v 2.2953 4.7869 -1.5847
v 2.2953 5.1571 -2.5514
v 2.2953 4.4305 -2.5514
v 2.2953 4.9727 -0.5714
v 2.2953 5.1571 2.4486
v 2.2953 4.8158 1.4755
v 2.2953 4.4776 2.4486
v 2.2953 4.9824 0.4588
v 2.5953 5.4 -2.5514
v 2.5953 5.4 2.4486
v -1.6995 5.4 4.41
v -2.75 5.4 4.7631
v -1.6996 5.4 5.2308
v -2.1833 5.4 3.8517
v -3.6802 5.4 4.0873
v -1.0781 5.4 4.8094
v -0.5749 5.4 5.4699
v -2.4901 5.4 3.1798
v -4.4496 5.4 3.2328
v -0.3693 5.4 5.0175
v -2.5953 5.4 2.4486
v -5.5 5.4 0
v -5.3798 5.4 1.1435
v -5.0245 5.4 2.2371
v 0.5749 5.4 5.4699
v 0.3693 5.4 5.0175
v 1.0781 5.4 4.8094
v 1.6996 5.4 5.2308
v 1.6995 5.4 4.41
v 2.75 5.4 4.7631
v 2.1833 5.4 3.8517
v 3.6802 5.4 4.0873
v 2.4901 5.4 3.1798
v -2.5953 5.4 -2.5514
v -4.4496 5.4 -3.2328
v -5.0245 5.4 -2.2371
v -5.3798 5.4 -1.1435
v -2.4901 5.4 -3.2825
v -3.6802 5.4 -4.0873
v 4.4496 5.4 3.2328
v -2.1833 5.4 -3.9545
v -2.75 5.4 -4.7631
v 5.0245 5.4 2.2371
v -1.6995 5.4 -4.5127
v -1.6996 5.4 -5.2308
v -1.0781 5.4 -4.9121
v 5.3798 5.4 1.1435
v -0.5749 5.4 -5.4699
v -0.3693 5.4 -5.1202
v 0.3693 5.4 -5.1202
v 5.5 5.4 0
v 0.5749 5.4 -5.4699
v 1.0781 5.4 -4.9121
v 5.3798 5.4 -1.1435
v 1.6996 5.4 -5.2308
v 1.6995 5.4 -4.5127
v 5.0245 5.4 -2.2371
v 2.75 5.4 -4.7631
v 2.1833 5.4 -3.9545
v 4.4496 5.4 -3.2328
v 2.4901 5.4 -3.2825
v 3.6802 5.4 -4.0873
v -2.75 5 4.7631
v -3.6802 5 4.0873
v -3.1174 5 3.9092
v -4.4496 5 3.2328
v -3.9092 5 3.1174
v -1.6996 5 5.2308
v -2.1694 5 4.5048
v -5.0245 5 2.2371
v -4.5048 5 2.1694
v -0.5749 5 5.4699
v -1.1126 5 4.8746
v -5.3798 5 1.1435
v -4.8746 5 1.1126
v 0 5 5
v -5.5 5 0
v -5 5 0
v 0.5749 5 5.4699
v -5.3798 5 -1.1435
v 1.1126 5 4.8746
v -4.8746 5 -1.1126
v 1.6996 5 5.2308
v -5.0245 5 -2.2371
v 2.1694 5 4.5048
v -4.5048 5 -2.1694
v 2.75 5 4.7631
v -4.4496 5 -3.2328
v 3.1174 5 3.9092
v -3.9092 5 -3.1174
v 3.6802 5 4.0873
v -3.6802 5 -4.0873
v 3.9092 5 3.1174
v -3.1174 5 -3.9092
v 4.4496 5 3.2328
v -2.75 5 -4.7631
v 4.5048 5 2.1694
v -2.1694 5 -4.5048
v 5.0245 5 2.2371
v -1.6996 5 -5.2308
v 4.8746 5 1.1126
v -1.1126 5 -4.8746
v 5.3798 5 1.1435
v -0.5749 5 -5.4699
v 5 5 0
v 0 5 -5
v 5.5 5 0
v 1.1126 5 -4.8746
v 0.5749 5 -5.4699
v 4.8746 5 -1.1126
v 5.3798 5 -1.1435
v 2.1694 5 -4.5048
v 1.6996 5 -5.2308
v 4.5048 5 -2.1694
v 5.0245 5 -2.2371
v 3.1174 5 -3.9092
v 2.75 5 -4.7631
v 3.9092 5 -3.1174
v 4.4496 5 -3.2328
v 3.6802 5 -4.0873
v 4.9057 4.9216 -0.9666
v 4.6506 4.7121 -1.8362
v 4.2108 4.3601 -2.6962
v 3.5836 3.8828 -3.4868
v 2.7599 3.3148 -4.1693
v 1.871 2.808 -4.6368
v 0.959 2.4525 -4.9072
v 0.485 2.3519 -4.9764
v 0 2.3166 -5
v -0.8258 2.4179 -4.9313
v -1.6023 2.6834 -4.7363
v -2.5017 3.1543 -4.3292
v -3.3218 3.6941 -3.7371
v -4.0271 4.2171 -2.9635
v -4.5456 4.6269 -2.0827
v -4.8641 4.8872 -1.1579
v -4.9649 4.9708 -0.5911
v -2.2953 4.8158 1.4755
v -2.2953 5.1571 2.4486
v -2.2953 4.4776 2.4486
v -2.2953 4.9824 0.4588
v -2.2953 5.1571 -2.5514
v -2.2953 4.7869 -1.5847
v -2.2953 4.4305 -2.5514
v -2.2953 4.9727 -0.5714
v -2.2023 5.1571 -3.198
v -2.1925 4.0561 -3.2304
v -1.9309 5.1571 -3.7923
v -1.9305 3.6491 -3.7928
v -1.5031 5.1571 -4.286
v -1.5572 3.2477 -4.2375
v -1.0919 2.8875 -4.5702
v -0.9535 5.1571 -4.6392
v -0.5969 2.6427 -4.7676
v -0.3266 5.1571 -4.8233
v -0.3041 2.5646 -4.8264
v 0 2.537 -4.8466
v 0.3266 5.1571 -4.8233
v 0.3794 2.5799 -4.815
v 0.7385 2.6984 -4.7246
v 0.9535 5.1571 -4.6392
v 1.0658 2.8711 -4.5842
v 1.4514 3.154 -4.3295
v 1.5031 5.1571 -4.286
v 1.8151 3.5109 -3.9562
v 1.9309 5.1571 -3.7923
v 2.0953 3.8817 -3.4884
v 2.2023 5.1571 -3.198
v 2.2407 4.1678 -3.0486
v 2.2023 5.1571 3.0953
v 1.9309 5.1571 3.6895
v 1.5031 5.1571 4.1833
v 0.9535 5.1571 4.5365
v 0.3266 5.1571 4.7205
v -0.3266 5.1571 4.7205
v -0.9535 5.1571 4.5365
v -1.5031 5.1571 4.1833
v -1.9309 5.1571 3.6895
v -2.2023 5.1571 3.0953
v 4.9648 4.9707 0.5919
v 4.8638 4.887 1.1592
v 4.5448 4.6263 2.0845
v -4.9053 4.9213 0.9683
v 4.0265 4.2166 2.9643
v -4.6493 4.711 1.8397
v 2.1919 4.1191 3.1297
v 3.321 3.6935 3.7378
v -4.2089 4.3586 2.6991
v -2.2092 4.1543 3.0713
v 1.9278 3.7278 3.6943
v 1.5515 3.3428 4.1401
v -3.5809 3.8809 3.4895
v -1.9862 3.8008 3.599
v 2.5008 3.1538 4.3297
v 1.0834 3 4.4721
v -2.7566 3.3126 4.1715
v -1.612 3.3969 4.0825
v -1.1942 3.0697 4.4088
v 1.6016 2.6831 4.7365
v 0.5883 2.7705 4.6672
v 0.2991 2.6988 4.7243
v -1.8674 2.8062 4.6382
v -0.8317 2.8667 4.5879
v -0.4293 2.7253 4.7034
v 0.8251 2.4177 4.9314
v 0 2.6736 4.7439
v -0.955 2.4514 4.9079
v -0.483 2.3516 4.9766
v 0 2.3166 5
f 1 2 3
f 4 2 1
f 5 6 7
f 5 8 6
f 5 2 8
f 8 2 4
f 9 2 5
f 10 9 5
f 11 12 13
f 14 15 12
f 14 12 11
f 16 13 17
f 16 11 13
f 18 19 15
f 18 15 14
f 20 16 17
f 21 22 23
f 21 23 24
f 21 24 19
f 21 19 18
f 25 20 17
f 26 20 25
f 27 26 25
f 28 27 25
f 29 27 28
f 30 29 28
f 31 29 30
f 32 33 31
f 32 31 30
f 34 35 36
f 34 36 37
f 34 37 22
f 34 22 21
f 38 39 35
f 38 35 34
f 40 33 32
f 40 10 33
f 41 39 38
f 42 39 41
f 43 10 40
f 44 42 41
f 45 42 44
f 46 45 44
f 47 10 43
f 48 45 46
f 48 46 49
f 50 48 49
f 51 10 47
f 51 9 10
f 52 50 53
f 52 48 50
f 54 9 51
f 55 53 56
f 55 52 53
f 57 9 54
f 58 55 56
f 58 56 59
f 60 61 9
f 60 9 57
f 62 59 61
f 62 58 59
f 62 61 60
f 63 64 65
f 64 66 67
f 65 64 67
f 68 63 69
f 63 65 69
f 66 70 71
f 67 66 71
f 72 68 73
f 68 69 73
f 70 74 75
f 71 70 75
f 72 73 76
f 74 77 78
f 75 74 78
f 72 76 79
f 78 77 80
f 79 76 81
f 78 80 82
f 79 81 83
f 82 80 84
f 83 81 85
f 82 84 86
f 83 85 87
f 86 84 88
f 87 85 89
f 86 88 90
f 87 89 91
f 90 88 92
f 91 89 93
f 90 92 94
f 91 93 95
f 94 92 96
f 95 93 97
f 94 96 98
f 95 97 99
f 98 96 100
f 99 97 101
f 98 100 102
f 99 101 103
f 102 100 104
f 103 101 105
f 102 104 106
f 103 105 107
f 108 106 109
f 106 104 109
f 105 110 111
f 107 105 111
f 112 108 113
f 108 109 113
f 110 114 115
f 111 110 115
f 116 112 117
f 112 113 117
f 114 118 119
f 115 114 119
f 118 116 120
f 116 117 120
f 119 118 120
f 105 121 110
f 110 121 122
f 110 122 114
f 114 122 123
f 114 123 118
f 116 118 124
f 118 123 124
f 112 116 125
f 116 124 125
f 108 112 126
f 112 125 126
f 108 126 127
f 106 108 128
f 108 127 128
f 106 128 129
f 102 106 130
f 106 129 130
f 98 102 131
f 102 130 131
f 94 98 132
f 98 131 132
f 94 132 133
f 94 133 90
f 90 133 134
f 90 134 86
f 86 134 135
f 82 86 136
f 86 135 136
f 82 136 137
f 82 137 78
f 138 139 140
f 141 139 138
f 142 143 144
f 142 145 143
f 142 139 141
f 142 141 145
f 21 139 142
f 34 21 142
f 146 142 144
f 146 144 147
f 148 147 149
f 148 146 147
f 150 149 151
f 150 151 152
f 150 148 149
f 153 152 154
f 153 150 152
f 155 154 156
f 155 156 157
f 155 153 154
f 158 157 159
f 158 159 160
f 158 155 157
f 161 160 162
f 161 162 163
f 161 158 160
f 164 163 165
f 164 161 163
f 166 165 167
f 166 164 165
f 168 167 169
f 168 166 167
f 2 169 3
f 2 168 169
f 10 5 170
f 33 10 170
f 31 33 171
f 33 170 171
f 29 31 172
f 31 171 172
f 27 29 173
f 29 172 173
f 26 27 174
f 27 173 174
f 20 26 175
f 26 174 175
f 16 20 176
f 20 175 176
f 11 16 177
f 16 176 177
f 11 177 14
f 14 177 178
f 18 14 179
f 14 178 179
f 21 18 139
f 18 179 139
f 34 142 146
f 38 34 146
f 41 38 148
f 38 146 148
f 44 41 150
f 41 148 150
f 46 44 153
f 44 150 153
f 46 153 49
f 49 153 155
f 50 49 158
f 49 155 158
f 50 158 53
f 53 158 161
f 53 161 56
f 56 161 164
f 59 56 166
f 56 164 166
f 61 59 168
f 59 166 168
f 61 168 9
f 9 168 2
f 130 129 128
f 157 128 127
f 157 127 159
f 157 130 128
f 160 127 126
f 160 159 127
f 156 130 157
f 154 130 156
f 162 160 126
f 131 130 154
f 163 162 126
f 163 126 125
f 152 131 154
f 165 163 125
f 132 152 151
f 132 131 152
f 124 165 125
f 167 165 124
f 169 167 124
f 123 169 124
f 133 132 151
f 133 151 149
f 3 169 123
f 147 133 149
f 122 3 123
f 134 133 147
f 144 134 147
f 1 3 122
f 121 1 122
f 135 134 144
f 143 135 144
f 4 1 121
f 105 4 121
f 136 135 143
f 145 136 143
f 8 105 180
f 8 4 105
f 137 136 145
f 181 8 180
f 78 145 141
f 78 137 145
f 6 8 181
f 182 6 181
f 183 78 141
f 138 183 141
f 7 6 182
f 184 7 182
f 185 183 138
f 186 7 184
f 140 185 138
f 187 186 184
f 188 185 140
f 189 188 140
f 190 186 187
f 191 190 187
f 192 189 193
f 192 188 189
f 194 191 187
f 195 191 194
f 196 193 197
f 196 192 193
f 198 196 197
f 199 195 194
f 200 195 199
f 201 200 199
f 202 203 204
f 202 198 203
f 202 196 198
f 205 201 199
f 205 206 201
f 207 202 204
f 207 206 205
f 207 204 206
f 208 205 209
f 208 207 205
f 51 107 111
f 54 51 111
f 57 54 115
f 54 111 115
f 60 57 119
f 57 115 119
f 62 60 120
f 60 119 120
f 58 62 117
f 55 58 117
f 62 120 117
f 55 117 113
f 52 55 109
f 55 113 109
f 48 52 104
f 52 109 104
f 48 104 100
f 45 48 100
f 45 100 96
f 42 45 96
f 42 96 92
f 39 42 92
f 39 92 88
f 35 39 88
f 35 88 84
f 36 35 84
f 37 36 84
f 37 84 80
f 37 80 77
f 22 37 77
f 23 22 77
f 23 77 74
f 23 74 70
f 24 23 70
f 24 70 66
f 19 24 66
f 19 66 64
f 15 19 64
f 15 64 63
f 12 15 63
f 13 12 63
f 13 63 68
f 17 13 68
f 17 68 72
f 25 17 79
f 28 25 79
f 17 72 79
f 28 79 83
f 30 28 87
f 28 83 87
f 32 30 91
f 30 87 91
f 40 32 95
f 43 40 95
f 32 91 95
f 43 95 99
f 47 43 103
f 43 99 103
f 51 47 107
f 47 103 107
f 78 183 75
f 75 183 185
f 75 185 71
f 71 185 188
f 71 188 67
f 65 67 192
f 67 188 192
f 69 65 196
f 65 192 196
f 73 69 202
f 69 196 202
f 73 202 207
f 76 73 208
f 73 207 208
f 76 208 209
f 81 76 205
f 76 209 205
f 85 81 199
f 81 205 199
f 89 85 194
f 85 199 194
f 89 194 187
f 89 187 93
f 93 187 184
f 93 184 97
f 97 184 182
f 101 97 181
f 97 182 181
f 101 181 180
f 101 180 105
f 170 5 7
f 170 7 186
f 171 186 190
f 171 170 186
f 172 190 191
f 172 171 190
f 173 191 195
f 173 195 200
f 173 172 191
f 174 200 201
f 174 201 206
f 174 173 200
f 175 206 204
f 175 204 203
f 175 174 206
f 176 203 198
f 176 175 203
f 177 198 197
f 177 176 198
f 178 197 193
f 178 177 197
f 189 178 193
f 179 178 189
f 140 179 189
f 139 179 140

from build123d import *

# Parameters (mm, degrees)
SKETCH1_R               = 5
BOSS_EXTRUDE1_DEPTH     = 5
SKETCH2_R               = 5.5
BOSS_EXTRUDE2_DEPTH     = 0.4
CUT_EXTRUDE1_DEPTH      = 6.4
SKETCH5_R               = 6
CUT_EXTRUDE2_DEPTH      = 6.5
CUT_EXTRUDE2_DEPTH_BACK = 6.5
CHAMFER4_SIZE           = 0.3
CHAMFER4_SIZE2          = 0.24293521


with BuildPart() as part:
    # Sketch1 → Boss-Extrude1 (new body)
    with BuildSketch(Plane(origin=(0, 0, 0), x_dir=(1, 0, 0), z_dir=(0, 1, 0))):
        Circle(SKETCH1_R)
    extrude(amount=BOSS_EXTRUDE1_DEPTH)

    # Sketch2 → Boss-Extrude2 (add)
    with BuildSketch(Plane(origin=(0, 5, 0), x_dir=(1, 0, 0), z_dir=(0, 1, 0))):
        Circle(SKETCH2_R)
    extrude(amount=BOSS_EXTRUDE2_DEPTH)

    # Sketch4 → Cut-Extrude1 (cut, through all)
    with BuildSketch(Plane(origin=(0, 5.4, 0), x_dir=(1, 0, 0), z_dir=(0, 1, 0))):
        with BuildLine():
            Line((2.295250379, 2.551364647), (2.295250379, -2.448635353))
            ThreePointArc((2.295250379, -2.448635353), (0, -4.743885732), (-2.295250379, -2.448635353))
            Line((-2.295250379, -2.448635353), (-2.295250379, 2.551364647))
            ThreePointArc((-2.295250379, 2.551364647), (0, 4.846615026), (2.295250379, 2.551364647))
        make_face()
    extrude(amount=-CUT_EXTRUDE1_DEPTH, mode=Mode.SUBTRACT)

    # Sketch5 → Cut-Extrude2 (cut, two sides)
    with BuildSketch(Plane(origin=(0, 0, 0), x_dir=(0, 0, -1), z_dir=(1, 0, 0))) as cut_extrude2_sk:
        with Locations((0, -1)):
            Circle(SKETCH5_R)
    extrude(amount=CUT_EXTRUDE2_DEPTH, mode=Mode.SUBTRACT)
    extrude(cut_extrude2_sk.sketch, amount=-CUT_EXTRUDE2_DEPTH_BACK, mode=Mode.SUBTRACT)

    # Chamfer4
    chamfer4_edges = [part.edges().sort_by_distance(p)[0] for p in [
        (0, 5.4, -4.846615026),
        (-2.295250379, 5.4, -0.051364647),
        (0, 5.4, 4.743885732),
        (2.295250379, 5.4, -0.051364647),
    ]]
    chamfer4_side = [part.faces().sort_by_distance(p)[0] for p in [
        (-5.344436508, 5.4, 0),
    ]]
    chamfer(chamfer4_edges, length=CHAMFER4_SIZE, length2=CHAMFER4_SIZE2, reference=chamfer4_side[0])


solid = part.part
